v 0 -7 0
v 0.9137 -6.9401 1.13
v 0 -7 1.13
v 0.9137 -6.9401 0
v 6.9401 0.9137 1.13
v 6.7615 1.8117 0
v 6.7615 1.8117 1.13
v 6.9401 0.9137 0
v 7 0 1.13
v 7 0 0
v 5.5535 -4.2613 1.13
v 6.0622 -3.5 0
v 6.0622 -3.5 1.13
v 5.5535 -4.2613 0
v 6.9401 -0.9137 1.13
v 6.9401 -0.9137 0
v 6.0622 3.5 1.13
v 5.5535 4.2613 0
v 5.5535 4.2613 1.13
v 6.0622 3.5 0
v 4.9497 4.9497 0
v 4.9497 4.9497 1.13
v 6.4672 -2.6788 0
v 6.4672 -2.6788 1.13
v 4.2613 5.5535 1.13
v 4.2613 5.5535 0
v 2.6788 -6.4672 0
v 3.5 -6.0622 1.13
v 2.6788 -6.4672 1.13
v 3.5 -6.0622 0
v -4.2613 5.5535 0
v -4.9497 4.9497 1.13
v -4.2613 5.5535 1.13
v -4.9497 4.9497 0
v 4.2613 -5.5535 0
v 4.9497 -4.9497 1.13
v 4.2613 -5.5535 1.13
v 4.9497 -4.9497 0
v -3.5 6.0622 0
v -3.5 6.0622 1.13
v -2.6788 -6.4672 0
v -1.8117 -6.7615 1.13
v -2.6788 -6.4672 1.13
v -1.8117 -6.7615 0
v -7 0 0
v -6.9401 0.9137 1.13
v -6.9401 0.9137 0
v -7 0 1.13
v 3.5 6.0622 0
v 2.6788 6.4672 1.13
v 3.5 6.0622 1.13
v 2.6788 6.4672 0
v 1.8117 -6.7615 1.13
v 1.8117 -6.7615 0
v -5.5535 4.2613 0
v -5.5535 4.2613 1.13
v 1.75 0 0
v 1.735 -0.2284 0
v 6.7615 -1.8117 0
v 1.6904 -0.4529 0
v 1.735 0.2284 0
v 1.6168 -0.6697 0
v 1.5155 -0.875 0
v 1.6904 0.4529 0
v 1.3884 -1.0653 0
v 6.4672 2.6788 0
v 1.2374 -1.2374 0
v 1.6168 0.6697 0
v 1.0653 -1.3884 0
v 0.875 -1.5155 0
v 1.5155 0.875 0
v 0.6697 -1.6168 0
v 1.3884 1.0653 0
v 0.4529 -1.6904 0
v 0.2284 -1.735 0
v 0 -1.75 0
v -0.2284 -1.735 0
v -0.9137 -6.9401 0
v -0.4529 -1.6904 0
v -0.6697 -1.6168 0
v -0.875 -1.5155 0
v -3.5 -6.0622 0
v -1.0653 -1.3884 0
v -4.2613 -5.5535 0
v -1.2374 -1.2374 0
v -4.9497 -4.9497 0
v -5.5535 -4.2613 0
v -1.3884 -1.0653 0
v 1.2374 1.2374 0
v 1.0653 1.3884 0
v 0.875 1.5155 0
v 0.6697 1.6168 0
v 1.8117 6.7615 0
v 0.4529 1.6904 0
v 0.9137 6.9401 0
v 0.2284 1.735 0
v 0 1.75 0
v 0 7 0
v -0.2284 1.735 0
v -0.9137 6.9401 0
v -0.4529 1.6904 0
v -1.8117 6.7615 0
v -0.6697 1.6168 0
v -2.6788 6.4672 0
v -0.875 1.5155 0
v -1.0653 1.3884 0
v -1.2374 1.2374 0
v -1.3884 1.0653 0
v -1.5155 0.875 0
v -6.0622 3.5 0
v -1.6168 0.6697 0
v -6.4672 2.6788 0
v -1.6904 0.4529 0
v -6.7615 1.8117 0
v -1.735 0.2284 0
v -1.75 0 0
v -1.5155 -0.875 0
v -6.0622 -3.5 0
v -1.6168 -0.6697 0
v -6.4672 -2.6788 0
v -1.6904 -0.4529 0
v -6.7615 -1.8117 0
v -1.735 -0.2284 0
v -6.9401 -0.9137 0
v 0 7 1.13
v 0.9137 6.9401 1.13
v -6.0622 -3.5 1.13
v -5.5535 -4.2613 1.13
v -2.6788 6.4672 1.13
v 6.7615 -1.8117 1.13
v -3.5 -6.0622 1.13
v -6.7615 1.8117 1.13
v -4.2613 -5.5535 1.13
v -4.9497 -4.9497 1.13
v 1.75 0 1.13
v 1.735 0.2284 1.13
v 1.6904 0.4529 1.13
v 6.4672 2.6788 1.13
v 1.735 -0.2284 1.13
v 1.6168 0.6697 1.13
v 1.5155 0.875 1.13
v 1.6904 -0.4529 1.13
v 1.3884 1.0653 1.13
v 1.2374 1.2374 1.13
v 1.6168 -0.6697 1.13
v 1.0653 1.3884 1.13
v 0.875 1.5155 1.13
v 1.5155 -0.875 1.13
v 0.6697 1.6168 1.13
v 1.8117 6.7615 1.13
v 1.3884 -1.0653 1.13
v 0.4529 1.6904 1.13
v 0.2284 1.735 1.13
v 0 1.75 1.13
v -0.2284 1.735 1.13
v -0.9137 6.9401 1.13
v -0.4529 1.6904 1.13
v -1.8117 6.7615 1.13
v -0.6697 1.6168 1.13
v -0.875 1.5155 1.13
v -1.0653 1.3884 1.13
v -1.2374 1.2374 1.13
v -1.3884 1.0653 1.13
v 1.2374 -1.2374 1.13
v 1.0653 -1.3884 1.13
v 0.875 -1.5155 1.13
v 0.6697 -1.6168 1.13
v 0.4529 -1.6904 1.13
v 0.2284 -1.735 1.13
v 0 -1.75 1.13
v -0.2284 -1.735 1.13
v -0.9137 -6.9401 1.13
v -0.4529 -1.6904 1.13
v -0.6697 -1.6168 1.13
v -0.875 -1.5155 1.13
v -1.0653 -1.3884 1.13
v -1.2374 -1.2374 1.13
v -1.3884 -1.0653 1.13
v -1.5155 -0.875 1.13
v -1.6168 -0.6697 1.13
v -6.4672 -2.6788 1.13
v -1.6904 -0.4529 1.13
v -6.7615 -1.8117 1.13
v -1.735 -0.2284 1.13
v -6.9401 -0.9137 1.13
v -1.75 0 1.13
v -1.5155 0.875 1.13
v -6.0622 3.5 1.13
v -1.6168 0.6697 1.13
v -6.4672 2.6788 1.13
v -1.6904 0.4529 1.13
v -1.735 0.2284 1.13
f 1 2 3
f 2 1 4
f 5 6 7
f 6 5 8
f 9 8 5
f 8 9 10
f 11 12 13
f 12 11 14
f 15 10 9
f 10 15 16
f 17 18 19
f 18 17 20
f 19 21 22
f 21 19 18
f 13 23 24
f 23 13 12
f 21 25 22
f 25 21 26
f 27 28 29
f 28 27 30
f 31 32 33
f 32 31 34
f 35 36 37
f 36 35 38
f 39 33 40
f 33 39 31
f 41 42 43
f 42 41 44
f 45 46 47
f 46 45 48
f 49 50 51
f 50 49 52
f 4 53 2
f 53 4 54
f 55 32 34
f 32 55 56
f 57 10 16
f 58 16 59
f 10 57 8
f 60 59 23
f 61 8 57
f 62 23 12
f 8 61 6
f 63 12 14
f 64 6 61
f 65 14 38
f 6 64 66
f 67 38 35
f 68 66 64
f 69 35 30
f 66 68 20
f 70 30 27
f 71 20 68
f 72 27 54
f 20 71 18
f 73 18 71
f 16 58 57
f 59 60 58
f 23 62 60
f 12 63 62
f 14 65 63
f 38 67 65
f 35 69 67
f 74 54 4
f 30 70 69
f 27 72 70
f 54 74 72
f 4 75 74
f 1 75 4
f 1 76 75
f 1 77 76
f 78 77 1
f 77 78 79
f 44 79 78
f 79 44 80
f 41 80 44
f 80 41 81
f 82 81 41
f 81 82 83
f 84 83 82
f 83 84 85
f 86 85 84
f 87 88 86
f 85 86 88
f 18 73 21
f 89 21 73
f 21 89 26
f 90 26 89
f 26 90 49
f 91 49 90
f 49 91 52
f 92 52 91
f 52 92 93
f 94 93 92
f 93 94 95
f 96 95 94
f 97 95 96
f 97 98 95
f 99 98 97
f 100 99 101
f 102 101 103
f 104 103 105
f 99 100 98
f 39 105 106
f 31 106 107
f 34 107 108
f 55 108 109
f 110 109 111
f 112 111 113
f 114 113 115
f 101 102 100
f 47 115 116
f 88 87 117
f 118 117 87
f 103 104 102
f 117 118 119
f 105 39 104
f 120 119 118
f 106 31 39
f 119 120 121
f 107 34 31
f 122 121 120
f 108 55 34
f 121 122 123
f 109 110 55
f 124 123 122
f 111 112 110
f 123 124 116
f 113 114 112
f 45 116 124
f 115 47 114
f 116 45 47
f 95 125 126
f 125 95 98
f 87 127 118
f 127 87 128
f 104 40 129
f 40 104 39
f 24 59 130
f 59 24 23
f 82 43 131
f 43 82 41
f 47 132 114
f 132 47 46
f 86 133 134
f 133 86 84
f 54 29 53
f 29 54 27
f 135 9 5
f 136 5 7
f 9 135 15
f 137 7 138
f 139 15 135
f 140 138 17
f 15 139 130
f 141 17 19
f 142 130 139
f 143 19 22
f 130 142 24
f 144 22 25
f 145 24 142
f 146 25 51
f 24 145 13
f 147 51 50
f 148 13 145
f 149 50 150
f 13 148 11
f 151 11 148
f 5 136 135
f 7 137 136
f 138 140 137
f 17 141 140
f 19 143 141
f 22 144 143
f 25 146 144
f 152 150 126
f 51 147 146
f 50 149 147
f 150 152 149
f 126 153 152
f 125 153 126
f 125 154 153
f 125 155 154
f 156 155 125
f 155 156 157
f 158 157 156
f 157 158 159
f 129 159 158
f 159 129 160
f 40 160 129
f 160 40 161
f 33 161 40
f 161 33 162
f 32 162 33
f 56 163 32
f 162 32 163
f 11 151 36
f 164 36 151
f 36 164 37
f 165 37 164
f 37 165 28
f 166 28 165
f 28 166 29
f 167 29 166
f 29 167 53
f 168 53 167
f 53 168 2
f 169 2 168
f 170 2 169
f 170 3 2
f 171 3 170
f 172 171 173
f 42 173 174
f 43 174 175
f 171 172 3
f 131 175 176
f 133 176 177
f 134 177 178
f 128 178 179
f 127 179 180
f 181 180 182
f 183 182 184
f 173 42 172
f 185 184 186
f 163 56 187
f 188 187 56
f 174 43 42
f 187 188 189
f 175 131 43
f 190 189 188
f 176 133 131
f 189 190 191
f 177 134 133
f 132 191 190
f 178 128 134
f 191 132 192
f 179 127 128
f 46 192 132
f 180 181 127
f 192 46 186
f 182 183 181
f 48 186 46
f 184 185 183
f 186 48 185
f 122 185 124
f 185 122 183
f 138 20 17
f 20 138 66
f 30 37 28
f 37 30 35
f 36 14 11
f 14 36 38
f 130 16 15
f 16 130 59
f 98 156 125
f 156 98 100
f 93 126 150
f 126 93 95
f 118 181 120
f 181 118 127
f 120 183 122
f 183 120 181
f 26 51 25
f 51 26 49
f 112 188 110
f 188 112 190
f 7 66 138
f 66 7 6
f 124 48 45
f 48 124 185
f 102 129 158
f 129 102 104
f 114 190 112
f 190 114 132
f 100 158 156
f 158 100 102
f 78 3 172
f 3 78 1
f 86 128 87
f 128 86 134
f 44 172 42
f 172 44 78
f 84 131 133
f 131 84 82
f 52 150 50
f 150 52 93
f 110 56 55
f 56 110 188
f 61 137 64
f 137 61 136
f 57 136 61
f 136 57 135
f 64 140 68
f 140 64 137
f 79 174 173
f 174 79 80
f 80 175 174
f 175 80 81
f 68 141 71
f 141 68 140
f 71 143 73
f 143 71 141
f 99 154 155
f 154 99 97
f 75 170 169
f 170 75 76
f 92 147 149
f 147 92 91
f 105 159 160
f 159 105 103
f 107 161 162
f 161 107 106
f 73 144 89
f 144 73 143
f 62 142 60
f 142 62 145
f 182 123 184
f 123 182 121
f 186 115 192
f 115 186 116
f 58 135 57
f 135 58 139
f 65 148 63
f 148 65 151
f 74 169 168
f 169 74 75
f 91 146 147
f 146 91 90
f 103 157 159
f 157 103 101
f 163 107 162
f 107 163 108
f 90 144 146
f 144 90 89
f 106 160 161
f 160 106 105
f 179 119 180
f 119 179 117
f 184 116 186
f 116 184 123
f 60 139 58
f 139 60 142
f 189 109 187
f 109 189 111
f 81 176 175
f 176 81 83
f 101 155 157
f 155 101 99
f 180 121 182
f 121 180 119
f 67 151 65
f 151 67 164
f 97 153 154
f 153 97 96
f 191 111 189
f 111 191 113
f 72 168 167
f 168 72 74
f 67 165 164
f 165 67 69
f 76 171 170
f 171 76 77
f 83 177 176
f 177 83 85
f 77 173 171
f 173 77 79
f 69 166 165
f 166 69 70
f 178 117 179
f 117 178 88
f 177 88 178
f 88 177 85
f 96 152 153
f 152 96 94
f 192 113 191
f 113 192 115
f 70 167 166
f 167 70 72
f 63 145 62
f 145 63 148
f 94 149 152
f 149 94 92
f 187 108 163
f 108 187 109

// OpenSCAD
// file: parameters.scad
// =============================================================================
// Gen-AW Dual-rotor copper-centroid pico AFPM - WOUND-AWARE (HARD GATE)
// PRIMARY challenger vs Gen-AT. Magnets @ R=38.0 + 215 t + former_web 1.20 -> m2m 4.66.
// =============================================================================

// --- Wire / wind budget (26 AWG, ~1 lb spool ~ 390 m bare-equiv) --------------
wire_awg            = 26;
wire_od             = 0.45;     // insulated OD mm
turns               = 215;      // +5 vs Gen-AT 210
fill                = 0.70;
layers_per_face     = 2;        // axial layers proud of EACH flange
wind_build_axial    = layers_per_face * wire_od * fill;   // 0.63 mm
wind_build_radial   = 3 * wire_od * fill;                 // 0.945 mm

// --- Pancake former (bare STL) -----------------------------------------------
coil_id_r           = 14.0;     // copper-centroid window centered ~R=38.0
coil_od_r           = 62.0;
span_deg            = 26.0;     // 12 stations x 30 deg pitch
former_web          = 1.20;     // print floor for LB walls (was AT 1.22)
flange_t            = 0.60;
wall                = 1.2;
slot_w              = 2.4;
mount_hole          = 3.5;
tab_len             = 7.0;

former_bare_h       = former_web + 2 * flange_t;            // 2.40 mm
coil_envelope_h     = former_bare_h + 2 * wind_build_axial; // 3.66 mm

// --- Running clearance (magnet face -> WOUND face) EACH side ------------------
run_clear           = 0.50;     // PASS floor >= 0.5
gap_spacer_h        = run_clear + wind_build_axial;         // 1.13 mm
m2m                 = coil_envelope_h + 2 * run_clear;      // 4.66 mm (beats Gen-AT 4.68)

// --- Mid stator (12 pancakes 3ph; winds proud both faces) ---------------------
coil_stations       = 12;
bay_r_in            = coil_id_r - 2.0 - wind_build_radial;
bay_r_out           = coil_od_r + 2.0 + wind_build_radial;
bay_span            = span_deg + 4.0;
bay_offset          = 2.0;
stator_thick        = former_bare_h;                        // winds proud +/-Z
stator_od           = 160.0;
shaft_clear_stator  = 34.0;
coil_mount_r        = 25.0;

// --- Rotors (x2) - 8xO20 @ R=38.0 (copper centroid) + 24xO5 Halbach ----------
large_pocket_d      = 20.3;
small_pocket_d      = 5.3;
pocket_h            = 5.2;
large_n             = 8;
R_large             = 38.0;     // covers ~28-48 over copper centroid ~38.0
R_small_inner       = 23.0;
R_small_mid         = 38.0;
R_small_outer       = 55.0;
carrier_od          = 156.0;
carrier_thick       = 7.5;
hub_h               = 10.0;
hub_od              = 30.0;
rotor_b_offset_deg  = 22.5;

// --- Modular MAX interface (Gen-E family) ------------------------------------
shaft_bore          = 8.35;
bearing_d           = 21.85;
bearing_h           = 7.2;
m3_clear            = 3.5;
bolt_r_inner        = 36.0;
bolt_n_inner        = 6;
flange_bolt_r       = 72.0;
flange_bolt_n       = 6;
brace_r             = 68.0;
brace_d             = 4.3;
brace_n             = 4;

spacer_pad_od       = 14.0;
spacer_pad_id       = m3_clear;
endbell_od          = 160.0;
endbell_thick       = 8.0;
endbell_shaft_clear = 10.0;

$fn = 64;
// main file
// Gen-AW gap spacer — h = run_clear + wind_build_axial
include <parameters.scad>;
$fn = 48;
difference() {
    cylinder(d=spacer_pad_od, h=gap_spacer_h);
    translate([0, 0, -0.1]) cylinder(d=spacer_pad_id, h=gap_spacer_h + 0.2);
}
